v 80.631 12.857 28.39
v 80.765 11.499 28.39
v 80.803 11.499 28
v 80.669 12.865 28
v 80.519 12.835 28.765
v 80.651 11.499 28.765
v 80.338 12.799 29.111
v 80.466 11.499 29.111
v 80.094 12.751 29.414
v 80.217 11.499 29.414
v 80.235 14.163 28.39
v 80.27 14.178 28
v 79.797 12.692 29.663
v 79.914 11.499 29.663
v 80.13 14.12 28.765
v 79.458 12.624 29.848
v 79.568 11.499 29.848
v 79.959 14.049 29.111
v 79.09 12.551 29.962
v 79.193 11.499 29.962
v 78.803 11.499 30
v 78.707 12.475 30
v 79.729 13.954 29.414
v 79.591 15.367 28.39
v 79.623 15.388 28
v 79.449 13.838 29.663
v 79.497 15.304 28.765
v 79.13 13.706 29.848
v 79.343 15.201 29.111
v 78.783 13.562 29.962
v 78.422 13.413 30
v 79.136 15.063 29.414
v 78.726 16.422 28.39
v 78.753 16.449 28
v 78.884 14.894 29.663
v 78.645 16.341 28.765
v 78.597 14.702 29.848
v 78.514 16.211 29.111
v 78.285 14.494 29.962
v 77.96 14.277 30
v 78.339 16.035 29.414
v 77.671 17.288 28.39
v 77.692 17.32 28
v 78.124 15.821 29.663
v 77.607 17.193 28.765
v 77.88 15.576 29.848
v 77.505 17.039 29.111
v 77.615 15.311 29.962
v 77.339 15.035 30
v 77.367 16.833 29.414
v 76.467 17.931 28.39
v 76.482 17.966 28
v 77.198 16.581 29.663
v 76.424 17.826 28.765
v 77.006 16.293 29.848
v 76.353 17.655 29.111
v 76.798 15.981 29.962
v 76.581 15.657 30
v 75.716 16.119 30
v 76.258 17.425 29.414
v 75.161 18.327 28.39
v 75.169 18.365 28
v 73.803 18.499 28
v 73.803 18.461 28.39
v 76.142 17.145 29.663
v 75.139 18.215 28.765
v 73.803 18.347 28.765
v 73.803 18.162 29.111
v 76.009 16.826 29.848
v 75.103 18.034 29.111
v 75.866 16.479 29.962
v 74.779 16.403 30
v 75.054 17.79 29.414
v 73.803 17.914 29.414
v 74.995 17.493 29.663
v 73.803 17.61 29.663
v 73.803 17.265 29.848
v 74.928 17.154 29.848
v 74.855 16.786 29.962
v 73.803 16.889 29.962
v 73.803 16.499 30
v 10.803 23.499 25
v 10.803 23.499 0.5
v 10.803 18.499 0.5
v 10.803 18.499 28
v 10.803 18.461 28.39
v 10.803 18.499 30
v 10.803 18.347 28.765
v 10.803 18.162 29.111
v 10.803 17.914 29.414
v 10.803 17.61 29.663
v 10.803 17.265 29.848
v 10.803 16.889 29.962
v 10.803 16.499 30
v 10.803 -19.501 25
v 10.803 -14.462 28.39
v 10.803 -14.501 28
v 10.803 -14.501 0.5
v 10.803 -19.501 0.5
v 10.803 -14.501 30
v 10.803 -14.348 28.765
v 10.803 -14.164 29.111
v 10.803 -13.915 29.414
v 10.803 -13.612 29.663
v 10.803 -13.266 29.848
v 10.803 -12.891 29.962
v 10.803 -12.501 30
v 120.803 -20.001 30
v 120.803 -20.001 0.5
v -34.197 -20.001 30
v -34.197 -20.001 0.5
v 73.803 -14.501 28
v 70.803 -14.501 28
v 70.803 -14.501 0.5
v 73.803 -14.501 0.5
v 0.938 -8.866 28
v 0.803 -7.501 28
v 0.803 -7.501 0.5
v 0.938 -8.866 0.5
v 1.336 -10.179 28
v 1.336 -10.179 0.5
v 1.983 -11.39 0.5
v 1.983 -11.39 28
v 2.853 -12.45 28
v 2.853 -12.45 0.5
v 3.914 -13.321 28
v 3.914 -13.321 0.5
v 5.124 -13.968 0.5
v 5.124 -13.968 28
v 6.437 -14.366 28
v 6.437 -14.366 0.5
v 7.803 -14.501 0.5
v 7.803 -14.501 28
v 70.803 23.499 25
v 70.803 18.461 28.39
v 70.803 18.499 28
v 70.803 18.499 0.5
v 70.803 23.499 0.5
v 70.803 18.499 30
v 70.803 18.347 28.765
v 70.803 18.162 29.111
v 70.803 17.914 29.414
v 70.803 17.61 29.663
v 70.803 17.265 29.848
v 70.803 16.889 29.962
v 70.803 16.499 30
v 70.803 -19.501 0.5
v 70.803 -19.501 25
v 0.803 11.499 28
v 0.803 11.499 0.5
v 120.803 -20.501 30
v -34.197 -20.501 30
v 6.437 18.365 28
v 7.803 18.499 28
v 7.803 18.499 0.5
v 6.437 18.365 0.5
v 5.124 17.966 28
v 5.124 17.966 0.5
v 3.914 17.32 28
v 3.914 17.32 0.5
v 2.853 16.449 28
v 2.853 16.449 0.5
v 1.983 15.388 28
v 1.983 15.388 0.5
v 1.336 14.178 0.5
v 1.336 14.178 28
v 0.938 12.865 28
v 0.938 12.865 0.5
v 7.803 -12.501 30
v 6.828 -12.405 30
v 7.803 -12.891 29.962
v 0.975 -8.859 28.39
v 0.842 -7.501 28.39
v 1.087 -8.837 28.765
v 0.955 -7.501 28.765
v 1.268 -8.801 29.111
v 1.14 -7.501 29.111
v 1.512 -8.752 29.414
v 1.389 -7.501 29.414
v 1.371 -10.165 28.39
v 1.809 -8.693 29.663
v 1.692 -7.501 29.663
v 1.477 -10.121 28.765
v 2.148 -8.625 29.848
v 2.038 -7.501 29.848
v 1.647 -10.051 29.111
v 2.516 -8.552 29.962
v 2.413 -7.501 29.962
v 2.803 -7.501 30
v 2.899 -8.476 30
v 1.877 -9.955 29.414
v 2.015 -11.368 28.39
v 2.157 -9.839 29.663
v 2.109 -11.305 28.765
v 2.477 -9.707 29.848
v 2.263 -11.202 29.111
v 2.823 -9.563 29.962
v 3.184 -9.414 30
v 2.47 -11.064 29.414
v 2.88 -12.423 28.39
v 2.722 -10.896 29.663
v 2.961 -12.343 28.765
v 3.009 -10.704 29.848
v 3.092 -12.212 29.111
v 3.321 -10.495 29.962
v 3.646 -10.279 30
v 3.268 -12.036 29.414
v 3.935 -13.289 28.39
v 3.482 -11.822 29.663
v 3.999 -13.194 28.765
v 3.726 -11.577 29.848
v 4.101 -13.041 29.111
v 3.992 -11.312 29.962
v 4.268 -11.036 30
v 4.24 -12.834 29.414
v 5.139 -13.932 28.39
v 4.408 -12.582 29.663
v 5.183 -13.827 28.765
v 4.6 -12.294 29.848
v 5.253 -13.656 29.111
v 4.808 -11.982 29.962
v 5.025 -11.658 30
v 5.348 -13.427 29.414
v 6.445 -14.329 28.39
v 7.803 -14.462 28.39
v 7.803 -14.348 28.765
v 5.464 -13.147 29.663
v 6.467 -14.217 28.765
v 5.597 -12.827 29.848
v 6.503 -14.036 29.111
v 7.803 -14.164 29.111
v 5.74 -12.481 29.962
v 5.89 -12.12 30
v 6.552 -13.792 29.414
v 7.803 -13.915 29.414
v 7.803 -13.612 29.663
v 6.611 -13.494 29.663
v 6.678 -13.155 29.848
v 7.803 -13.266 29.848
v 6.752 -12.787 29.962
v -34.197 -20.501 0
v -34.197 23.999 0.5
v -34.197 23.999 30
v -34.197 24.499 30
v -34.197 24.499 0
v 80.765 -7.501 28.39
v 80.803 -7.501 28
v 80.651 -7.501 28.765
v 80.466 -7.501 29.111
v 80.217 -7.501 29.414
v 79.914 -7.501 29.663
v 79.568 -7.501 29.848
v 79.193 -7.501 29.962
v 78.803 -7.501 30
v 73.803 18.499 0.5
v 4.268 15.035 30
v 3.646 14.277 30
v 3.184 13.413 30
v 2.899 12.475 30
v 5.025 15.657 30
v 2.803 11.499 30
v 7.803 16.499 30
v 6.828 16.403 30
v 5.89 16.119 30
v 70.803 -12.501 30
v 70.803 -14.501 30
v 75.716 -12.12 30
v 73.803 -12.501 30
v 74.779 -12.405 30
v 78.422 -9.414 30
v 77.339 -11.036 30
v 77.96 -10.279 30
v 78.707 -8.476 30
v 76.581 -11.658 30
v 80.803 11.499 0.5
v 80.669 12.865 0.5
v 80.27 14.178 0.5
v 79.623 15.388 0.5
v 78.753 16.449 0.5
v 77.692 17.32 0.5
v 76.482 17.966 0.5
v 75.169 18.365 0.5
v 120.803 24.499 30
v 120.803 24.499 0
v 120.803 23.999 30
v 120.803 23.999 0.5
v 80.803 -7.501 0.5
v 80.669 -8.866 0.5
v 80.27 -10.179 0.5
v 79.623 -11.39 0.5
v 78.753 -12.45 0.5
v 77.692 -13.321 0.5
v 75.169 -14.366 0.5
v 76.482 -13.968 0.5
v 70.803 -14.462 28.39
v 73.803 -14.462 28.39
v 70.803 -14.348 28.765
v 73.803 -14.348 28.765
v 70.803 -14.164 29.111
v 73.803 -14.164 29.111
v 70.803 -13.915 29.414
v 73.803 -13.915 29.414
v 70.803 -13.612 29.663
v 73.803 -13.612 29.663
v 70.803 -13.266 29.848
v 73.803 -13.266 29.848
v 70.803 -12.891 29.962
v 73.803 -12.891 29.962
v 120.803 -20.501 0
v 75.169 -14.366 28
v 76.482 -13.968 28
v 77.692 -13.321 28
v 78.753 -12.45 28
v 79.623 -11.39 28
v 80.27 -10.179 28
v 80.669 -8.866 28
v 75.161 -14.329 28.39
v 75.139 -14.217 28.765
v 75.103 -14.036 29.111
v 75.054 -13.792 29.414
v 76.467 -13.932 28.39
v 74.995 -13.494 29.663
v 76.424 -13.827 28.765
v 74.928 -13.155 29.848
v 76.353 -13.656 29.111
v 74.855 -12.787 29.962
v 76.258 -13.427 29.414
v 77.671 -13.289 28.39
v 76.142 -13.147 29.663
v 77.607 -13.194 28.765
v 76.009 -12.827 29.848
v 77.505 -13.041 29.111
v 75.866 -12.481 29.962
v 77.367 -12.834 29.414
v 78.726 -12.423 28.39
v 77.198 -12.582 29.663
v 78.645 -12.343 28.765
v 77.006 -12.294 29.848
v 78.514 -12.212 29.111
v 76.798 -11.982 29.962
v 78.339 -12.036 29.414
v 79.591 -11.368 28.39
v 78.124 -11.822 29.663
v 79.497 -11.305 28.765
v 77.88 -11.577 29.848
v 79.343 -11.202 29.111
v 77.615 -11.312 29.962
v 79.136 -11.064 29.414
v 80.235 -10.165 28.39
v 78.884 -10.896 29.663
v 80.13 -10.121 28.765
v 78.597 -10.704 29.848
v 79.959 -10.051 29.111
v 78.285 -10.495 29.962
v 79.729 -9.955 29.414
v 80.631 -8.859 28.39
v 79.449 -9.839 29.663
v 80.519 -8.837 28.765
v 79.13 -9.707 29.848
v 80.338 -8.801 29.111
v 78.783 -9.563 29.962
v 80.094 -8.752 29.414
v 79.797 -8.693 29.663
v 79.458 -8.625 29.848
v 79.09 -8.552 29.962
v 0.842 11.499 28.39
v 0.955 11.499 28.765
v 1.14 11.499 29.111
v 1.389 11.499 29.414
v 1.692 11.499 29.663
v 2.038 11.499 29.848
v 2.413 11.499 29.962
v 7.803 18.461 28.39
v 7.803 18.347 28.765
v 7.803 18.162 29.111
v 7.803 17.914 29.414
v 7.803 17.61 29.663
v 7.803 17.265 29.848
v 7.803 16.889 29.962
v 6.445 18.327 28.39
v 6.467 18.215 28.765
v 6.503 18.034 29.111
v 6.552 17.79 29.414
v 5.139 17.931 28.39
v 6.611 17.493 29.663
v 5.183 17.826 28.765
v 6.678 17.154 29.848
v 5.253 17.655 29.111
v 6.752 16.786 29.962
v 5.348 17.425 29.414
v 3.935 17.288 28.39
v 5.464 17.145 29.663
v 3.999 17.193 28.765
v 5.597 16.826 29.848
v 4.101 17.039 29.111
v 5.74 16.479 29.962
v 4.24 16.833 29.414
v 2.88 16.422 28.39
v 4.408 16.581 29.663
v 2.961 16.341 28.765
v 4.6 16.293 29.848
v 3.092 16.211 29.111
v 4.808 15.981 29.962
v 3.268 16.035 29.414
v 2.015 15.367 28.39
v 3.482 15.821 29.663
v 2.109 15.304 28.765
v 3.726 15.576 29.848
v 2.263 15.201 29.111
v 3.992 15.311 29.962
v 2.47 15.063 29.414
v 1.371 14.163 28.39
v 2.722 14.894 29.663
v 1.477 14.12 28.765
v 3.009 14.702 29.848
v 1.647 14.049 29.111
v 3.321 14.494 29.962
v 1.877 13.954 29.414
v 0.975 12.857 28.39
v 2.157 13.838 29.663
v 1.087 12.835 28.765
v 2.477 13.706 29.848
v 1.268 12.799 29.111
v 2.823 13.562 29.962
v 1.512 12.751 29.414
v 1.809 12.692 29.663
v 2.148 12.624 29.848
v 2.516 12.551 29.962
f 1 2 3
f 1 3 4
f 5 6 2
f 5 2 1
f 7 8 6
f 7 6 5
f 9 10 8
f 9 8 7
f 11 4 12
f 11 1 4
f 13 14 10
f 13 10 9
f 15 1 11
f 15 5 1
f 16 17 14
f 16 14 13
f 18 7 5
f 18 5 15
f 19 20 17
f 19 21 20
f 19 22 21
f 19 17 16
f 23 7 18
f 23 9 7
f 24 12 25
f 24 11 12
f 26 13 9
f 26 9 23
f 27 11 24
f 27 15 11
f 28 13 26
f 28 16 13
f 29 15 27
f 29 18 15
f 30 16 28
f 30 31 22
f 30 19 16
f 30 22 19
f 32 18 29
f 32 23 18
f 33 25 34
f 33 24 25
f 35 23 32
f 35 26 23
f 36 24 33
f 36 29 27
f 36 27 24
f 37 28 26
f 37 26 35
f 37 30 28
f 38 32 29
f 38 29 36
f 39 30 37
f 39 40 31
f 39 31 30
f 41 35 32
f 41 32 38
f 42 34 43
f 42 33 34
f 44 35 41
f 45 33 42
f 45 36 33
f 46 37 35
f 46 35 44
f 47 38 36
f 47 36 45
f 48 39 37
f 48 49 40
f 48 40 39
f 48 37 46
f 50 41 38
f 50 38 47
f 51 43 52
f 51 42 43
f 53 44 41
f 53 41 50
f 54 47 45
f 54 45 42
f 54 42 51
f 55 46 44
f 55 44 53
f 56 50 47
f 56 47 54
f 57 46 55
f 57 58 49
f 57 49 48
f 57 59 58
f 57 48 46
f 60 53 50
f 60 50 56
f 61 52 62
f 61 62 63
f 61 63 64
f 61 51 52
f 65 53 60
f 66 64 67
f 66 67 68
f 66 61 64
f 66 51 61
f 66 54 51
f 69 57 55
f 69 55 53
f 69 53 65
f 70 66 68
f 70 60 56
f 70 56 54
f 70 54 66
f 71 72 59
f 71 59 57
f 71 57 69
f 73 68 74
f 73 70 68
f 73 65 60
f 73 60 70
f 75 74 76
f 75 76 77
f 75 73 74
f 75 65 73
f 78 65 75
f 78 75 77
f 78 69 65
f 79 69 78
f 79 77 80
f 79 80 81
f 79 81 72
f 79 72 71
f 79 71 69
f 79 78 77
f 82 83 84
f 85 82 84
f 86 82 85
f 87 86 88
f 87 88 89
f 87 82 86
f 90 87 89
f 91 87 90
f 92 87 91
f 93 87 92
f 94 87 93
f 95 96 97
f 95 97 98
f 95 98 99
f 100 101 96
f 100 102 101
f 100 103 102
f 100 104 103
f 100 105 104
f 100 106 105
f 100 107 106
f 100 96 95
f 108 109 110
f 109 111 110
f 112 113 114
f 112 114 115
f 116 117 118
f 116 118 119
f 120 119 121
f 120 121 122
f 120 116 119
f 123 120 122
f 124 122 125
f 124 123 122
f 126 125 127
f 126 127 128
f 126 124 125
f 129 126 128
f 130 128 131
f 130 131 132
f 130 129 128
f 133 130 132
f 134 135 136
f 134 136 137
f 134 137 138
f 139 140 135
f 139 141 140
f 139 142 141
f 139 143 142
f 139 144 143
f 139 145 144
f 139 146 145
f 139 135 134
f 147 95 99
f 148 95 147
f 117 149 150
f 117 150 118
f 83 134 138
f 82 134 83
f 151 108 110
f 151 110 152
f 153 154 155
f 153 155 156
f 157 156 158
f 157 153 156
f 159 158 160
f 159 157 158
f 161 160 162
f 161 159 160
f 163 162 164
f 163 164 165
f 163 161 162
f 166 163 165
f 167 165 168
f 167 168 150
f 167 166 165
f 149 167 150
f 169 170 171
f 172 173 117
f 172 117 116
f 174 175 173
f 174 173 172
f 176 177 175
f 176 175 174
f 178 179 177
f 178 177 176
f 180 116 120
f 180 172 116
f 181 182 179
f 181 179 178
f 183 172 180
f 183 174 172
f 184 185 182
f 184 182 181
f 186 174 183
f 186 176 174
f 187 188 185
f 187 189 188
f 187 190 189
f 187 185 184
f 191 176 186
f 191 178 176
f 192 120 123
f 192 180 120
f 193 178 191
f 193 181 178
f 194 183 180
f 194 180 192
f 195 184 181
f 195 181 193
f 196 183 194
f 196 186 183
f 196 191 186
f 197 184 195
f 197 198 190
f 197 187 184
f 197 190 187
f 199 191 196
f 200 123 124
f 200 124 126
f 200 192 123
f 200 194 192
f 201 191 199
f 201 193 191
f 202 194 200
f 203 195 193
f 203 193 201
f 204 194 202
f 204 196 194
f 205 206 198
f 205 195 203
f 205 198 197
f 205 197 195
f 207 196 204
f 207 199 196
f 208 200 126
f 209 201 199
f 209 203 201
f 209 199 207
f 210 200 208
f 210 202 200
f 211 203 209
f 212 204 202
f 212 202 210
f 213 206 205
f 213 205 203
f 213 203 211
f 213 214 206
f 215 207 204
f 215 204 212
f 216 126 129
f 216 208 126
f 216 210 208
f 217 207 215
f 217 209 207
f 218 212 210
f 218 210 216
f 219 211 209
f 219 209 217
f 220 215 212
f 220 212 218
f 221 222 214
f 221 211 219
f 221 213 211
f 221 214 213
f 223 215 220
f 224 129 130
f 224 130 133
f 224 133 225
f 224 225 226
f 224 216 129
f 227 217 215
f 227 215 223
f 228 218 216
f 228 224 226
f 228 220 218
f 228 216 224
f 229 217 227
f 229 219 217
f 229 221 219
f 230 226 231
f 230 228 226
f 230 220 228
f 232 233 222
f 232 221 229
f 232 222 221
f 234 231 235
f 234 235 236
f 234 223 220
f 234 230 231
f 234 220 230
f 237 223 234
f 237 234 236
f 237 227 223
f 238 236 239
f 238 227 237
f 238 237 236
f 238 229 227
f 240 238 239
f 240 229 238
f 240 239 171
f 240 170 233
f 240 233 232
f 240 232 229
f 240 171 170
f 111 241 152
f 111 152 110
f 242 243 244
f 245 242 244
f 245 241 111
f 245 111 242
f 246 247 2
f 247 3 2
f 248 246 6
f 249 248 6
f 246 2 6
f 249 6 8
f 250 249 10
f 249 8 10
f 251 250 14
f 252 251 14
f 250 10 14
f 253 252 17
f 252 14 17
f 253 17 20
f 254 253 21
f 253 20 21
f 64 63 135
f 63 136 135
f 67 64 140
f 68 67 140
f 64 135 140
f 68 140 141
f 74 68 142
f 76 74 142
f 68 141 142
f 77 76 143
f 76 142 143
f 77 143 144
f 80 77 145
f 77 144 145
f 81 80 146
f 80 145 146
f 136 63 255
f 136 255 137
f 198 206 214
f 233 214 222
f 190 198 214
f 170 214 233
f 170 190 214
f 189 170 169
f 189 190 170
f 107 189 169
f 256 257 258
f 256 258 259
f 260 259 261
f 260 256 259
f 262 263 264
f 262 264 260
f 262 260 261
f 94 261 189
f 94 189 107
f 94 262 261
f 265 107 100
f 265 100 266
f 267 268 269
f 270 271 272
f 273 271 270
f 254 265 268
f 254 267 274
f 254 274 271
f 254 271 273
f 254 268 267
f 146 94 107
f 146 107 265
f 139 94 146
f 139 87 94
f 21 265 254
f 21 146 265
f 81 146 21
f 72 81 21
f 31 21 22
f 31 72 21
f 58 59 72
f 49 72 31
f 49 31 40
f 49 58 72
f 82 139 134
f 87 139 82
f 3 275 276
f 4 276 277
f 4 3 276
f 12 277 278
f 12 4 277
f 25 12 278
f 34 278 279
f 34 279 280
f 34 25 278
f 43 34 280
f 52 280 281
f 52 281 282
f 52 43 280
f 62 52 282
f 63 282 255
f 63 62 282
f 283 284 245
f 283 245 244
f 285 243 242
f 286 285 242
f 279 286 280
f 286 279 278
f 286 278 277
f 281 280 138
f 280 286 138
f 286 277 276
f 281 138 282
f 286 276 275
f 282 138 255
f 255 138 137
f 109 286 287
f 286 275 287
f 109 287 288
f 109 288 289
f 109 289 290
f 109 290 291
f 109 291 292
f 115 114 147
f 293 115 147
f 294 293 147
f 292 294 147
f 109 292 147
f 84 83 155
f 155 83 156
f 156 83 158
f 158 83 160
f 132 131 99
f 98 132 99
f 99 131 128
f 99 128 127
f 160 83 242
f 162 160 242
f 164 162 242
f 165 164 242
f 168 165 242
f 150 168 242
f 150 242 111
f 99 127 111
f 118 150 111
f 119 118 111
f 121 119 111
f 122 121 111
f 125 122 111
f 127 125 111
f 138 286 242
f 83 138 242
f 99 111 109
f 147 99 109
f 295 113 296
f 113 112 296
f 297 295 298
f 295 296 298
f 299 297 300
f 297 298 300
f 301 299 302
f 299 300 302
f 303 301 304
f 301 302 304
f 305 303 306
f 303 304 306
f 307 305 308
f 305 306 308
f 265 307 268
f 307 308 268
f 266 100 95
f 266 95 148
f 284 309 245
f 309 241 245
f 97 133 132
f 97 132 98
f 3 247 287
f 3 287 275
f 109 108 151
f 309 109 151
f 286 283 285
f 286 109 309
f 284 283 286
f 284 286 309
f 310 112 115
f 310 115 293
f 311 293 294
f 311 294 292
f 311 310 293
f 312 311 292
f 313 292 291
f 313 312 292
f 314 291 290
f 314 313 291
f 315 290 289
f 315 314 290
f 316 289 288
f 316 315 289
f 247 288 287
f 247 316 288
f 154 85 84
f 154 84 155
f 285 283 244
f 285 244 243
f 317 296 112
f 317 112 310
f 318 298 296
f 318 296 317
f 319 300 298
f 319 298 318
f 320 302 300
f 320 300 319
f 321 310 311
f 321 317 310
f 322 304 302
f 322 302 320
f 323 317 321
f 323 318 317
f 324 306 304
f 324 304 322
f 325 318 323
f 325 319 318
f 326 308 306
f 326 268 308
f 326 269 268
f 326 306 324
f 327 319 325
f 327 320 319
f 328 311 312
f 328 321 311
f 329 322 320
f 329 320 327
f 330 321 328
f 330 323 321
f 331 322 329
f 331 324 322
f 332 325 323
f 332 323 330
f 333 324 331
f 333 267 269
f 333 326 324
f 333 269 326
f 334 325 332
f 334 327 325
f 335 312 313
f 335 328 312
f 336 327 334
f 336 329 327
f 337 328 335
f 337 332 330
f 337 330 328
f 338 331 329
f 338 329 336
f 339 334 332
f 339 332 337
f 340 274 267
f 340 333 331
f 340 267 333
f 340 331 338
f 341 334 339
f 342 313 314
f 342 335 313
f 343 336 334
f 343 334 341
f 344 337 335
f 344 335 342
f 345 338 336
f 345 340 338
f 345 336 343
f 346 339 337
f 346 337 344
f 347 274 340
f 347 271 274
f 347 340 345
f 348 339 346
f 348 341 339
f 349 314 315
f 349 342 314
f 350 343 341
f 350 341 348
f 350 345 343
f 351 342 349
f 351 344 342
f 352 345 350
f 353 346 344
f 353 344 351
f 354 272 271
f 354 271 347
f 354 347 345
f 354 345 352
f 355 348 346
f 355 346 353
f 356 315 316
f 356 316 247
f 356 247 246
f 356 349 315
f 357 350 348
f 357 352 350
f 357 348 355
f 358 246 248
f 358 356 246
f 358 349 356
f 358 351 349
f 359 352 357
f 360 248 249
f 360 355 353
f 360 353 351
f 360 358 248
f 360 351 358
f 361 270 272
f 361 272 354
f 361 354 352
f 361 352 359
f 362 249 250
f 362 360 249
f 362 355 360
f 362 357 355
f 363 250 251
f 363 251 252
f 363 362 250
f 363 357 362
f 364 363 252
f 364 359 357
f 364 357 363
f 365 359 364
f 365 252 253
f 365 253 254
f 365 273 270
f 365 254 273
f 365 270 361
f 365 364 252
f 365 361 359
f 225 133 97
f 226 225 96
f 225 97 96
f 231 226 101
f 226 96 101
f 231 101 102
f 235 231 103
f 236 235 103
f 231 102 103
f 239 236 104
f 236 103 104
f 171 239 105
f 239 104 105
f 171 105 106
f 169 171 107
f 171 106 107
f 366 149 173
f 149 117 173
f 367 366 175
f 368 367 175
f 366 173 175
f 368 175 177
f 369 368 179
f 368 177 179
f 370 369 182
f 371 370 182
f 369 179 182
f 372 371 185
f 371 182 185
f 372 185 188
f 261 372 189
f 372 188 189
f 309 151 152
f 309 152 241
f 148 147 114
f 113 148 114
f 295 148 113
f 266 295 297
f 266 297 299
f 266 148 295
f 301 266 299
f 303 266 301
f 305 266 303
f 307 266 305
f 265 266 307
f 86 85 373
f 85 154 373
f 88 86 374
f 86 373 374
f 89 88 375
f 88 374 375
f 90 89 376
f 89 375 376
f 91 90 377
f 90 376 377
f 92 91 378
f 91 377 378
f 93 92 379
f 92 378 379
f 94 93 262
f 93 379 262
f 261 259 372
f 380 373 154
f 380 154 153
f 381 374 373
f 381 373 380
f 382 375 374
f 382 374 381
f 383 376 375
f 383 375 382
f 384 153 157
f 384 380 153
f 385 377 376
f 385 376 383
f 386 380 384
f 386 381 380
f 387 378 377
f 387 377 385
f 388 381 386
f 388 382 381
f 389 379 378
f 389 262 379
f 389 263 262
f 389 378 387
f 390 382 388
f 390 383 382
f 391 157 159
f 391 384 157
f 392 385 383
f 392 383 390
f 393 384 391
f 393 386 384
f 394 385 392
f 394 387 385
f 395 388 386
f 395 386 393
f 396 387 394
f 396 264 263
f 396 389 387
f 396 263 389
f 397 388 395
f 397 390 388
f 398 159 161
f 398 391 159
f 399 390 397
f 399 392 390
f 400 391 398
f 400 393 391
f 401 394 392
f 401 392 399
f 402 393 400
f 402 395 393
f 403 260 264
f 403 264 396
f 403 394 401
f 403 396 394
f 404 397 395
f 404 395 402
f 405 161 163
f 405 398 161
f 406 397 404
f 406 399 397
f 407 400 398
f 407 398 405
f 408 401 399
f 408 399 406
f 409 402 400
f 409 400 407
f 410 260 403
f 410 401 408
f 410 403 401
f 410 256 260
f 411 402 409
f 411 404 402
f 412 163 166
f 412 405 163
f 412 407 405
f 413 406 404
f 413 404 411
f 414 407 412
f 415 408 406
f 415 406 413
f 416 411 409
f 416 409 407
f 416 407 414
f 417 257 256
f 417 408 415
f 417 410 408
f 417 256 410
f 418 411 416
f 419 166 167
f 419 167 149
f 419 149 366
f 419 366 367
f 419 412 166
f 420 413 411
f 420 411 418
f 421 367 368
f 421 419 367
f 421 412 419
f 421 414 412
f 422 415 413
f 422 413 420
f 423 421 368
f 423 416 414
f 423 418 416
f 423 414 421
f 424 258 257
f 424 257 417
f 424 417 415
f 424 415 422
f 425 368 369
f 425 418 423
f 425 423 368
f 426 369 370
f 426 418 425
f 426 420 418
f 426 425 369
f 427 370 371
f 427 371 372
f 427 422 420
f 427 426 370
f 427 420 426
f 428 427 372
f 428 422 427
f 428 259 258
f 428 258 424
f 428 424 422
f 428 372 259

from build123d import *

# Parameters (mm, degrees)
SKETCH1_W               = 150
SKETCH1_H               = 45
EXTRUDE1_DEPTH          = 30
CUT_EXTRUDE1_DEPTH      = 29.5
FILLET1_R               = 2
CHAMFER1_SIZE           = 5
SALIENTE_EXTRUIR1_DEPTH = 5


with BuildPart() as part:
    # Sketch1 → Extrude1 (new body)
    with BuildSketch(Plane.XY):
        with Locations((40.803073286, 1.99929078)):
            Rectangle(SKETCH1_W, SKETCH1_H)
    extrude(amount=EXTRUDE1_DEPTH)

    # Sketch2 → Cut-Extrude1 (cut)
    with BuildSketch(Plane.XY.offset(30)):
        Polygon((-34.196926714, 23.99929078), (-34.196926714, -20.00070922), (-33.696926714, -20.00070922), (10.803073286, -20.00070922), (70.803073286, -20.00070922), (115.303073286, -20.00070922), (115.803073286, -20.00070922), (115.803073286, 23.99929078), (115.303073286, 23.99929078), (70.803073286, 23.99929078), (10.803073286, 23.99929078), (-33.696926714, 23.99929078), align=None)
        with BuildLine():
            Line((70.803073286, -19.50070922), (70.803073286, -14.50070922))
            Line((70.803073286, -14.50070922), (73.803073286, -14.50070922))
            ThreePointArc((73.803073286, -14.50070922), (78.752820754, -12.450456688), (80.803073286, -7.50070922))
            Line((80.803073286, -7.50070922), (80.803073286, 11.49929078))
            ThreePointArc((80.803073286, 11.49929078), (78.752820754, 16.449038248), (73.803073286, 18.49929078))
            Line((73.803073286, 18.49929078), (70.803073286, 18.49929078))
            Line((70.803073286, 18.49929078), (70.803073286, 23.49929078))
            Line((70.803073286, 23.49929078), (10.803073286, 23.49929078))
            Line((10.803073286, 23.49929078), (10.803073286, 18.49929078))
            Line((10.803073286, 18.49929078), (7.803073286, 18.49929078))
            ThreePointArc((7.803073286, 18.49929078), (2.853325818, 16.449038248), (0.803073286, 11.49929078))
            Line((0.803073286, 11.49929078), (0.803073286, -7.50070922))
            ThreePointArc((0.803073286, -7.50070922), (2.853325818, -12.450456688), (7.803073286, -14.50070922))
            Line((7.803073286, -14.50070922), (10.803073286, -14.50070922))
            Line((10.803073286, -14.50070922), (10.803073286, -19.50070922))
            Line((10.803073286, -19.50070922), (70.803073286, -19.50070922))
        make_face(mode=Mode.SUBTRACT)
    extrude(amount=-CUT_EXTRUDE1_DEPTH, mode=Mode.SUBTRACT)

    # Fillet1
    fillet1_edges = [part.edges().sort_by_distance(p)[0] for p in [
        (78.752820754, -12.450456688, 30),
        (80.803073286, 1.99929078, 30),
        (78.752820754, 16.449038248, 30),
        (72.303073286, 18.49929078, 30),
        (9.303073286, 18.49929078, 30),
        (2.853325818, 16.449038248, 30),
        (0.803073286, 1.99929078, 30),
        (2.853325818, -12.450456688, 30),
        (9.303073286, -14.50070922, 30),
        (72.303073286, -14.50070922, 30),
    ]]
    fillet(fillet1_edges, radius=FILLET1_R)

    # Chamfer1
    chamfer1_edges = [part.edges().sort_by_distance(p)[0] for p in [
        (40.803073286, 23.49929078, 30),
        (40.803073286, -19.50070922, 30),
    ]]
    chamfer(chamfer1_edges, length=CHAMFER1_SIZE)

    # Croquis1 → Saliente-Extruir1 (add)
    with BuildSketch(Plane(origin=(115.803073286, 0, 0), x_dir=(0, 0, -1), z_dir=(1, 0, 0))):
        Polygon((-0.5, 23.99929078), (-0.5, -20.00070922), (-30, -20.00070922), (-30, -20.50070922), (0, -20.50070922), (0, 24.49929078), (-30, 24.49929078), (-30, 23.99929078), align=None)
    extrude(amount=SALIENTE_EXTRUIR1_DEPTH)


solid = part.part
